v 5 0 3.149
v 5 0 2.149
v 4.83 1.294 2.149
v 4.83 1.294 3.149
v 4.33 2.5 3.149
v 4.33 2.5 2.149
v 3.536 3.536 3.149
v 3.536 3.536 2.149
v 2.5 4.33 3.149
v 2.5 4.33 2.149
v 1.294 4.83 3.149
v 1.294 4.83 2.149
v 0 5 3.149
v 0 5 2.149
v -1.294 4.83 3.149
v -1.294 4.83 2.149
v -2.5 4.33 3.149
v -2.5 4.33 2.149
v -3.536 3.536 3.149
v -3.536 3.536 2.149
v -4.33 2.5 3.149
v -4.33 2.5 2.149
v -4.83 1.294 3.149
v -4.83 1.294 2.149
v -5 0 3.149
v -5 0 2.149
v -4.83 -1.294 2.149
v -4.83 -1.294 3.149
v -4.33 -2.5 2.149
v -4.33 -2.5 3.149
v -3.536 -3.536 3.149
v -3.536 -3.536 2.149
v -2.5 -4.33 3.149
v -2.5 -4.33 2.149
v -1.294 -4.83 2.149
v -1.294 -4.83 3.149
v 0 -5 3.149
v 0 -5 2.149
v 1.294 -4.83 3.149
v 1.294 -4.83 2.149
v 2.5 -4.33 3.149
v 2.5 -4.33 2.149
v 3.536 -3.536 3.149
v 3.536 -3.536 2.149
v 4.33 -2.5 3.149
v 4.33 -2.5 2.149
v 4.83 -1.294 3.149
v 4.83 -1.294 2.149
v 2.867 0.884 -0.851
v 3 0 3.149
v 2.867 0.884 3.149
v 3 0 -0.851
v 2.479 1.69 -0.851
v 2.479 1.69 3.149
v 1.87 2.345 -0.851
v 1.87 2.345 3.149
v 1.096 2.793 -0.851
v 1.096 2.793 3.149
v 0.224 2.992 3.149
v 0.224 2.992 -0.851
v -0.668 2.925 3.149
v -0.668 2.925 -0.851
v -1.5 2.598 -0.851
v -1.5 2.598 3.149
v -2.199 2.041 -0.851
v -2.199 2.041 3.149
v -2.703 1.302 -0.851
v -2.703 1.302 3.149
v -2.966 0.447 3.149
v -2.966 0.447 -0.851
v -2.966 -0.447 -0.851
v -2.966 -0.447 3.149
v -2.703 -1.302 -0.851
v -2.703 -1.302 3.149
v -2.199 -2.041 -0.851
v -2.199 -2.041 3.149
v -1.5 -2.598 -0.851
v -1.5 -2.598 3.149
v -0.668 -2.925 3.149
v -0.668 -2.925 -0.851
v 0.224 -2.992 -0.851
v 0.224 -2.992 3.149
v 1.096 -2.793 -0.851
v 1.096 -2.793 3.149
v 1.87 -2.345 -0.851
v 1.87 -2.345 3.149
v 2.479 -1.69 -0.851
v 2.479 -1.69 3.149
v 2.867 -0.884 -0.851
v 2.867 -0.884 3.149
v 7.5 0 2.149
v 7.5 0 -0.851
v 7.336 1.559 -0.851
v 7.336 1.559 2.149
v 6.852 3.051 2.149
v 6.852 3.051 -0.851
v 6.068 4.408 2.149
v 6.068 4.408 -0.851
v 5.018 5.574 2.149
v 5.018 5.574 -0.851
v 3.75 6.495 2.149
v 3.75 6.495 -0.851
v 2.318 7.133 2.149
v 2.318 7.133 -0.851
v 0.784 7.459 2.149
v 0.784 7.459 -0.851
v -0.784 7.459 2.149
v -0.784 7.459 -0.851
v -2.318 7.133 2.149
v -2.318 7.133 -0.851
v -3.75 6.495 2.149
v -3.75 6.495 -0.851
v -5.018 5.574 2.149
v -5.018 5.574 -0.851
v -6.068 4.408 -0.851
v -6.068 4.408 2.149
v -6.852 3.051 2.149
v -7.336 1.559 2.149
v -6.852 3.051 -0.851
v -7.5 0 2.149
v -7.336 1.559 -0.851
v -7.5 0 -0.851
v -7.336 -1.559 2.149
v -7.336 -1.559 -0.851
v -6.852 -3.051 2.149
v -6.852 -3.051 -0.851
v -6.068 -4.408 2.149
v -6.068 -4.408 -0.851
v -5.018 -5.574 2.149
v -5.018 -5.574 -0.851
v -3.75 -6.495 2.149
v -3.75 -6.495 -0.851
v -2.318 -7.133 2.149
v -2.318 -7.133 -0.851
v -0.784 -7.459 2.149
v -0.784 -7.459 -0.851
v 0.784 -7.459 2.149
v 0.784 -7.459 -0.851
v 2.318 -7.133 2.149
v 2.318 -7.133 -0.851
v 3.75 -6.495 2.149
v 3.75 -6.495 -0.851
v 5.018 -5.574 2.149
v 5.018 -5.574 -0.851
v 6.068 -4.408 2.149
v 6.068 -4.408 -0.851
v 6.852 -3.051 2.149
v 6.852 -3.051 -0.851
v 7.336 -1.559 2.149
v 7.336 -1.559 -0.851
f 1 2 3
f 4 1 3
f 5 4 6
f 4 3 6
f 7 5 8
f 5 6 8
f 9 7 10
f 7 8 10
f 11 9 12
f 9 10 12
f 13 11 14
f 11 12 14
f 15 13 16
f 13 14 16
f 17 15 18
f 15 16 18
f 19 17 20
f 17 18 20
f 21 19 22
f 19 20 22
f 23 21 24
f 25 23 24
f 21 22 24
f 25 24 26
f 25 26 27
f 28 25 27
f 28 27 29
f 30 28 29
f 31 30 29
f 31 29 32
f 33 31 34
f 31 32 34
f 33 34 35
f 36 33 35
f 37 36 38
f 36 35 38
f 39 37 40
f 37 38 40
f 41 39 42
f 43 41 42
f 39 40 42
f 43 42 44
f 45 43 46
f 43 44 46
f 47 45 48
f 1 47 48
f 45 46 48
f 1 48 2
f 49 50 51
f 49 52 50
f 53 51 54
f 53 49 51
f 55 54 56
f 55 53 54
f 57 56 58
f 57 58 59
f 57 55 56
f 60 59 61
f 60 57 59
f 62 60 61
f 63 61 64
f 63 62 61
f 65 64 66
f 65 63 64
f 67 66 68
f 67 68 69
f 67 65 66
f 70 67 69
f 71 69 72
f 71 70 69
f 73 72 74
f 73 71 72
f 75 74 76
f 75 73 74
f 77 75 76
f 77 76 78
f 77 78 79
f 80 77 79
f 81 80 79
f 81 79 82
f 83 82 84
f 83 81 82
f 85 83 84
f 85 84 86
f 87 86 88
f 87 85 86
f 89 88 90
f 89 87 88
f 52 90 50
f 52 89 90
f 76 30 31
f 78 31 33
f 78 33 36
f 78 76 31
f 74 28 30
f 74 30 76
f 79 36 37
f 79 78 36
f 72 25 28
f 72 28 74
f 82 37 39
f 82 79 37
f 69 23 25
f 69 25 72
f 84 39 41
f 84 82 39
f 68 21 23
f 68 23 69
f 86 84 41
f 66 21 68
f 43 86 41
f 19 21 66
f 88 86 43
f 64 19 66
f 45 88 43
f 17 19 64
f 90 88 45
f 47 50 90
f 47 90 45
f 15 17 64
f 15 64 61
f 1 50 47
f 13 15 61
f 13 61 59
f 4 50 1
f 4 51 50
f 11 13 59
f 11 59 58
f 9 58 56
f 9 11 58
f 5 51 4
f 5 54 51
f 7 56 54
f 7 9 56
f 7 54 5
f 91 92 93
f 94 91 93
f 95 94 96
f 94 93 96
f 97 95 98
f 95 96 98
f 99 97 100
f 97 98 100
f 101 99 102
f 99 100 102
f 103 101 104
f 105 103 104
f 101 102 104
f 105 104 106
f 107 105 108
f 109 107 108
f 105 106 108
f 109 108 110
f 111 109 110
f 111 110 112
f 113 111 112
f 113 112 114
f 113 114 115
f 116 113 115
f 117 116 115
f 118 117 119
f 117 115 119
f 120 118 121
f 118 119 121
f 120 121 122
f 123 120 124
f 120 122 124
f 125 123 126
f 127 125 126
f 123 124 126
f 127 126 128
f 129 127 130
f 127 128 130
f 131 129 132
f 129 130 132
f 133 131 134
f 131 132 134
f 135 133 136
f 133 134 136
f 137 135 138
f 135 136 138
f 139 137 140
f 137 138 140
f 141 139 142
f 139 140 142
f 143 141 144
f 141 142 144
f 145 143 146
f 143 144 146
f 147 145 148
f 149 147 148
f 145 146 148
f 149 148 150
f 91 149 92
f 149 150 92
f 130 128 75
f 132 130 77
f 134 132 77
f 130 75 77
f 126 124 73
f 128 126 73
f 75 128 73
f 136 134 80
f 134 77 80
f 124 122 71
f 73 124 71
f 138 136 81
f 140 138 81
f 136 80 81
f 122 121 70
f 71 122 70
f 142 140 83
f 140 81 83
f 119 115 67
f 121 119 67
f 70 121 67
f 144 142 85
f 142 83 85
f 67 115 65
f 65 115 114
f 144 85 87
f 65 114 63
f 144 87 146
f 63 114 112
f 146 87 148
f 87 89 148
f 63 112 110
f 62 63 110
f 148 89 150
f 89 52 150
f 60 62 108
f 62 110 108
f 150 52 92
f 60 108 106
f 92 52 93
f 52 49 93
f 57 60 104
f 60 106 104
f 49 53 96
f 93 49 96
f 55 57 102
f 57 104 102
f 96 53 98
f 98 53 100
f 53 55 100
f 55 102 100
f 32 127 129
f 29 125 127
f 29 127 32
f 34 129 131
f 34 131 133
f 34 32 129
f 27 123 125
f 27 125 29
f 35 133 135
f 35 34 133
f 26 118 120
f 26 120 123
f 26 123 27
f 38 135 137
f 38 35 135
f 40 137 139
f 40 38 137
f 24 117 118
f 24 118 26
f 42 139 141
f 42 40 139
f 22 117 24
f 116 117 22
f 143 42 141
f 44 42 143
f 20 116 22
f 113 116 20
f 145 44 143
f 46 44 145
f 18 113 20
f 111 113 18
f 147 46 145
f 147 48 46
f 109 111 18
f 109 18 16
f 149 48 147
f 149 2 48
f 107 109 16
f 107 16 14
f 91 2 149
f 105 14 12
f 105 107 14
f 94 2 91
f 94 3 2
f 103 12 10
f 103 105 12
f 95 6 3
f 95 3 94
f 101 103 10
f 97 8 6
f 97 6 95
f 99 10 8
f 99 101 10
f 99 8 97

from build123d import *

# Parameters (mm, degrees)
SKETCH1_R           = 3.75
SKETCH1_R_2         = 1.5
BOSS_EXTRUDE1_DEPTH = 1.5
SKETCH2_R           = 2.5
SKETCH2_R_2         = 1.5
BOSS_EXTRUDE2_DEPTH = 0.5
SCALE1_SCALE        = 2


with BuildPart() as part:
    # Sketch1 → Boss-Extrude1 (new body)
    with BuildSketch(Plane.XY):
        Circle(SKETCH1_R)
        Circle(SKETCH1_R_2, mode=Mode.SUBTRACT)
    extrude(amount=BOSS_EXTRUDE1_DEPTH)

    # Sketch2 → Boss-Extrude2 (add)
    with BuildSketch(Plane.XY.offset(1.5)):
        Circle(SKETCH2_R)
        Circle(SKETCH2_R_2, mode=Mode.SUBTRACT)
    extrude(amount=BOSS_EXTRUDE2_DEPTH)


with BuildPart() as part_1:
    # Scale1: scaled about (0, 0, 0.851426307)
    add(part.part.scale(SCALE1_SCALE).moved(Location((0, 0, -0.851426307))))


solid = part_1.part
